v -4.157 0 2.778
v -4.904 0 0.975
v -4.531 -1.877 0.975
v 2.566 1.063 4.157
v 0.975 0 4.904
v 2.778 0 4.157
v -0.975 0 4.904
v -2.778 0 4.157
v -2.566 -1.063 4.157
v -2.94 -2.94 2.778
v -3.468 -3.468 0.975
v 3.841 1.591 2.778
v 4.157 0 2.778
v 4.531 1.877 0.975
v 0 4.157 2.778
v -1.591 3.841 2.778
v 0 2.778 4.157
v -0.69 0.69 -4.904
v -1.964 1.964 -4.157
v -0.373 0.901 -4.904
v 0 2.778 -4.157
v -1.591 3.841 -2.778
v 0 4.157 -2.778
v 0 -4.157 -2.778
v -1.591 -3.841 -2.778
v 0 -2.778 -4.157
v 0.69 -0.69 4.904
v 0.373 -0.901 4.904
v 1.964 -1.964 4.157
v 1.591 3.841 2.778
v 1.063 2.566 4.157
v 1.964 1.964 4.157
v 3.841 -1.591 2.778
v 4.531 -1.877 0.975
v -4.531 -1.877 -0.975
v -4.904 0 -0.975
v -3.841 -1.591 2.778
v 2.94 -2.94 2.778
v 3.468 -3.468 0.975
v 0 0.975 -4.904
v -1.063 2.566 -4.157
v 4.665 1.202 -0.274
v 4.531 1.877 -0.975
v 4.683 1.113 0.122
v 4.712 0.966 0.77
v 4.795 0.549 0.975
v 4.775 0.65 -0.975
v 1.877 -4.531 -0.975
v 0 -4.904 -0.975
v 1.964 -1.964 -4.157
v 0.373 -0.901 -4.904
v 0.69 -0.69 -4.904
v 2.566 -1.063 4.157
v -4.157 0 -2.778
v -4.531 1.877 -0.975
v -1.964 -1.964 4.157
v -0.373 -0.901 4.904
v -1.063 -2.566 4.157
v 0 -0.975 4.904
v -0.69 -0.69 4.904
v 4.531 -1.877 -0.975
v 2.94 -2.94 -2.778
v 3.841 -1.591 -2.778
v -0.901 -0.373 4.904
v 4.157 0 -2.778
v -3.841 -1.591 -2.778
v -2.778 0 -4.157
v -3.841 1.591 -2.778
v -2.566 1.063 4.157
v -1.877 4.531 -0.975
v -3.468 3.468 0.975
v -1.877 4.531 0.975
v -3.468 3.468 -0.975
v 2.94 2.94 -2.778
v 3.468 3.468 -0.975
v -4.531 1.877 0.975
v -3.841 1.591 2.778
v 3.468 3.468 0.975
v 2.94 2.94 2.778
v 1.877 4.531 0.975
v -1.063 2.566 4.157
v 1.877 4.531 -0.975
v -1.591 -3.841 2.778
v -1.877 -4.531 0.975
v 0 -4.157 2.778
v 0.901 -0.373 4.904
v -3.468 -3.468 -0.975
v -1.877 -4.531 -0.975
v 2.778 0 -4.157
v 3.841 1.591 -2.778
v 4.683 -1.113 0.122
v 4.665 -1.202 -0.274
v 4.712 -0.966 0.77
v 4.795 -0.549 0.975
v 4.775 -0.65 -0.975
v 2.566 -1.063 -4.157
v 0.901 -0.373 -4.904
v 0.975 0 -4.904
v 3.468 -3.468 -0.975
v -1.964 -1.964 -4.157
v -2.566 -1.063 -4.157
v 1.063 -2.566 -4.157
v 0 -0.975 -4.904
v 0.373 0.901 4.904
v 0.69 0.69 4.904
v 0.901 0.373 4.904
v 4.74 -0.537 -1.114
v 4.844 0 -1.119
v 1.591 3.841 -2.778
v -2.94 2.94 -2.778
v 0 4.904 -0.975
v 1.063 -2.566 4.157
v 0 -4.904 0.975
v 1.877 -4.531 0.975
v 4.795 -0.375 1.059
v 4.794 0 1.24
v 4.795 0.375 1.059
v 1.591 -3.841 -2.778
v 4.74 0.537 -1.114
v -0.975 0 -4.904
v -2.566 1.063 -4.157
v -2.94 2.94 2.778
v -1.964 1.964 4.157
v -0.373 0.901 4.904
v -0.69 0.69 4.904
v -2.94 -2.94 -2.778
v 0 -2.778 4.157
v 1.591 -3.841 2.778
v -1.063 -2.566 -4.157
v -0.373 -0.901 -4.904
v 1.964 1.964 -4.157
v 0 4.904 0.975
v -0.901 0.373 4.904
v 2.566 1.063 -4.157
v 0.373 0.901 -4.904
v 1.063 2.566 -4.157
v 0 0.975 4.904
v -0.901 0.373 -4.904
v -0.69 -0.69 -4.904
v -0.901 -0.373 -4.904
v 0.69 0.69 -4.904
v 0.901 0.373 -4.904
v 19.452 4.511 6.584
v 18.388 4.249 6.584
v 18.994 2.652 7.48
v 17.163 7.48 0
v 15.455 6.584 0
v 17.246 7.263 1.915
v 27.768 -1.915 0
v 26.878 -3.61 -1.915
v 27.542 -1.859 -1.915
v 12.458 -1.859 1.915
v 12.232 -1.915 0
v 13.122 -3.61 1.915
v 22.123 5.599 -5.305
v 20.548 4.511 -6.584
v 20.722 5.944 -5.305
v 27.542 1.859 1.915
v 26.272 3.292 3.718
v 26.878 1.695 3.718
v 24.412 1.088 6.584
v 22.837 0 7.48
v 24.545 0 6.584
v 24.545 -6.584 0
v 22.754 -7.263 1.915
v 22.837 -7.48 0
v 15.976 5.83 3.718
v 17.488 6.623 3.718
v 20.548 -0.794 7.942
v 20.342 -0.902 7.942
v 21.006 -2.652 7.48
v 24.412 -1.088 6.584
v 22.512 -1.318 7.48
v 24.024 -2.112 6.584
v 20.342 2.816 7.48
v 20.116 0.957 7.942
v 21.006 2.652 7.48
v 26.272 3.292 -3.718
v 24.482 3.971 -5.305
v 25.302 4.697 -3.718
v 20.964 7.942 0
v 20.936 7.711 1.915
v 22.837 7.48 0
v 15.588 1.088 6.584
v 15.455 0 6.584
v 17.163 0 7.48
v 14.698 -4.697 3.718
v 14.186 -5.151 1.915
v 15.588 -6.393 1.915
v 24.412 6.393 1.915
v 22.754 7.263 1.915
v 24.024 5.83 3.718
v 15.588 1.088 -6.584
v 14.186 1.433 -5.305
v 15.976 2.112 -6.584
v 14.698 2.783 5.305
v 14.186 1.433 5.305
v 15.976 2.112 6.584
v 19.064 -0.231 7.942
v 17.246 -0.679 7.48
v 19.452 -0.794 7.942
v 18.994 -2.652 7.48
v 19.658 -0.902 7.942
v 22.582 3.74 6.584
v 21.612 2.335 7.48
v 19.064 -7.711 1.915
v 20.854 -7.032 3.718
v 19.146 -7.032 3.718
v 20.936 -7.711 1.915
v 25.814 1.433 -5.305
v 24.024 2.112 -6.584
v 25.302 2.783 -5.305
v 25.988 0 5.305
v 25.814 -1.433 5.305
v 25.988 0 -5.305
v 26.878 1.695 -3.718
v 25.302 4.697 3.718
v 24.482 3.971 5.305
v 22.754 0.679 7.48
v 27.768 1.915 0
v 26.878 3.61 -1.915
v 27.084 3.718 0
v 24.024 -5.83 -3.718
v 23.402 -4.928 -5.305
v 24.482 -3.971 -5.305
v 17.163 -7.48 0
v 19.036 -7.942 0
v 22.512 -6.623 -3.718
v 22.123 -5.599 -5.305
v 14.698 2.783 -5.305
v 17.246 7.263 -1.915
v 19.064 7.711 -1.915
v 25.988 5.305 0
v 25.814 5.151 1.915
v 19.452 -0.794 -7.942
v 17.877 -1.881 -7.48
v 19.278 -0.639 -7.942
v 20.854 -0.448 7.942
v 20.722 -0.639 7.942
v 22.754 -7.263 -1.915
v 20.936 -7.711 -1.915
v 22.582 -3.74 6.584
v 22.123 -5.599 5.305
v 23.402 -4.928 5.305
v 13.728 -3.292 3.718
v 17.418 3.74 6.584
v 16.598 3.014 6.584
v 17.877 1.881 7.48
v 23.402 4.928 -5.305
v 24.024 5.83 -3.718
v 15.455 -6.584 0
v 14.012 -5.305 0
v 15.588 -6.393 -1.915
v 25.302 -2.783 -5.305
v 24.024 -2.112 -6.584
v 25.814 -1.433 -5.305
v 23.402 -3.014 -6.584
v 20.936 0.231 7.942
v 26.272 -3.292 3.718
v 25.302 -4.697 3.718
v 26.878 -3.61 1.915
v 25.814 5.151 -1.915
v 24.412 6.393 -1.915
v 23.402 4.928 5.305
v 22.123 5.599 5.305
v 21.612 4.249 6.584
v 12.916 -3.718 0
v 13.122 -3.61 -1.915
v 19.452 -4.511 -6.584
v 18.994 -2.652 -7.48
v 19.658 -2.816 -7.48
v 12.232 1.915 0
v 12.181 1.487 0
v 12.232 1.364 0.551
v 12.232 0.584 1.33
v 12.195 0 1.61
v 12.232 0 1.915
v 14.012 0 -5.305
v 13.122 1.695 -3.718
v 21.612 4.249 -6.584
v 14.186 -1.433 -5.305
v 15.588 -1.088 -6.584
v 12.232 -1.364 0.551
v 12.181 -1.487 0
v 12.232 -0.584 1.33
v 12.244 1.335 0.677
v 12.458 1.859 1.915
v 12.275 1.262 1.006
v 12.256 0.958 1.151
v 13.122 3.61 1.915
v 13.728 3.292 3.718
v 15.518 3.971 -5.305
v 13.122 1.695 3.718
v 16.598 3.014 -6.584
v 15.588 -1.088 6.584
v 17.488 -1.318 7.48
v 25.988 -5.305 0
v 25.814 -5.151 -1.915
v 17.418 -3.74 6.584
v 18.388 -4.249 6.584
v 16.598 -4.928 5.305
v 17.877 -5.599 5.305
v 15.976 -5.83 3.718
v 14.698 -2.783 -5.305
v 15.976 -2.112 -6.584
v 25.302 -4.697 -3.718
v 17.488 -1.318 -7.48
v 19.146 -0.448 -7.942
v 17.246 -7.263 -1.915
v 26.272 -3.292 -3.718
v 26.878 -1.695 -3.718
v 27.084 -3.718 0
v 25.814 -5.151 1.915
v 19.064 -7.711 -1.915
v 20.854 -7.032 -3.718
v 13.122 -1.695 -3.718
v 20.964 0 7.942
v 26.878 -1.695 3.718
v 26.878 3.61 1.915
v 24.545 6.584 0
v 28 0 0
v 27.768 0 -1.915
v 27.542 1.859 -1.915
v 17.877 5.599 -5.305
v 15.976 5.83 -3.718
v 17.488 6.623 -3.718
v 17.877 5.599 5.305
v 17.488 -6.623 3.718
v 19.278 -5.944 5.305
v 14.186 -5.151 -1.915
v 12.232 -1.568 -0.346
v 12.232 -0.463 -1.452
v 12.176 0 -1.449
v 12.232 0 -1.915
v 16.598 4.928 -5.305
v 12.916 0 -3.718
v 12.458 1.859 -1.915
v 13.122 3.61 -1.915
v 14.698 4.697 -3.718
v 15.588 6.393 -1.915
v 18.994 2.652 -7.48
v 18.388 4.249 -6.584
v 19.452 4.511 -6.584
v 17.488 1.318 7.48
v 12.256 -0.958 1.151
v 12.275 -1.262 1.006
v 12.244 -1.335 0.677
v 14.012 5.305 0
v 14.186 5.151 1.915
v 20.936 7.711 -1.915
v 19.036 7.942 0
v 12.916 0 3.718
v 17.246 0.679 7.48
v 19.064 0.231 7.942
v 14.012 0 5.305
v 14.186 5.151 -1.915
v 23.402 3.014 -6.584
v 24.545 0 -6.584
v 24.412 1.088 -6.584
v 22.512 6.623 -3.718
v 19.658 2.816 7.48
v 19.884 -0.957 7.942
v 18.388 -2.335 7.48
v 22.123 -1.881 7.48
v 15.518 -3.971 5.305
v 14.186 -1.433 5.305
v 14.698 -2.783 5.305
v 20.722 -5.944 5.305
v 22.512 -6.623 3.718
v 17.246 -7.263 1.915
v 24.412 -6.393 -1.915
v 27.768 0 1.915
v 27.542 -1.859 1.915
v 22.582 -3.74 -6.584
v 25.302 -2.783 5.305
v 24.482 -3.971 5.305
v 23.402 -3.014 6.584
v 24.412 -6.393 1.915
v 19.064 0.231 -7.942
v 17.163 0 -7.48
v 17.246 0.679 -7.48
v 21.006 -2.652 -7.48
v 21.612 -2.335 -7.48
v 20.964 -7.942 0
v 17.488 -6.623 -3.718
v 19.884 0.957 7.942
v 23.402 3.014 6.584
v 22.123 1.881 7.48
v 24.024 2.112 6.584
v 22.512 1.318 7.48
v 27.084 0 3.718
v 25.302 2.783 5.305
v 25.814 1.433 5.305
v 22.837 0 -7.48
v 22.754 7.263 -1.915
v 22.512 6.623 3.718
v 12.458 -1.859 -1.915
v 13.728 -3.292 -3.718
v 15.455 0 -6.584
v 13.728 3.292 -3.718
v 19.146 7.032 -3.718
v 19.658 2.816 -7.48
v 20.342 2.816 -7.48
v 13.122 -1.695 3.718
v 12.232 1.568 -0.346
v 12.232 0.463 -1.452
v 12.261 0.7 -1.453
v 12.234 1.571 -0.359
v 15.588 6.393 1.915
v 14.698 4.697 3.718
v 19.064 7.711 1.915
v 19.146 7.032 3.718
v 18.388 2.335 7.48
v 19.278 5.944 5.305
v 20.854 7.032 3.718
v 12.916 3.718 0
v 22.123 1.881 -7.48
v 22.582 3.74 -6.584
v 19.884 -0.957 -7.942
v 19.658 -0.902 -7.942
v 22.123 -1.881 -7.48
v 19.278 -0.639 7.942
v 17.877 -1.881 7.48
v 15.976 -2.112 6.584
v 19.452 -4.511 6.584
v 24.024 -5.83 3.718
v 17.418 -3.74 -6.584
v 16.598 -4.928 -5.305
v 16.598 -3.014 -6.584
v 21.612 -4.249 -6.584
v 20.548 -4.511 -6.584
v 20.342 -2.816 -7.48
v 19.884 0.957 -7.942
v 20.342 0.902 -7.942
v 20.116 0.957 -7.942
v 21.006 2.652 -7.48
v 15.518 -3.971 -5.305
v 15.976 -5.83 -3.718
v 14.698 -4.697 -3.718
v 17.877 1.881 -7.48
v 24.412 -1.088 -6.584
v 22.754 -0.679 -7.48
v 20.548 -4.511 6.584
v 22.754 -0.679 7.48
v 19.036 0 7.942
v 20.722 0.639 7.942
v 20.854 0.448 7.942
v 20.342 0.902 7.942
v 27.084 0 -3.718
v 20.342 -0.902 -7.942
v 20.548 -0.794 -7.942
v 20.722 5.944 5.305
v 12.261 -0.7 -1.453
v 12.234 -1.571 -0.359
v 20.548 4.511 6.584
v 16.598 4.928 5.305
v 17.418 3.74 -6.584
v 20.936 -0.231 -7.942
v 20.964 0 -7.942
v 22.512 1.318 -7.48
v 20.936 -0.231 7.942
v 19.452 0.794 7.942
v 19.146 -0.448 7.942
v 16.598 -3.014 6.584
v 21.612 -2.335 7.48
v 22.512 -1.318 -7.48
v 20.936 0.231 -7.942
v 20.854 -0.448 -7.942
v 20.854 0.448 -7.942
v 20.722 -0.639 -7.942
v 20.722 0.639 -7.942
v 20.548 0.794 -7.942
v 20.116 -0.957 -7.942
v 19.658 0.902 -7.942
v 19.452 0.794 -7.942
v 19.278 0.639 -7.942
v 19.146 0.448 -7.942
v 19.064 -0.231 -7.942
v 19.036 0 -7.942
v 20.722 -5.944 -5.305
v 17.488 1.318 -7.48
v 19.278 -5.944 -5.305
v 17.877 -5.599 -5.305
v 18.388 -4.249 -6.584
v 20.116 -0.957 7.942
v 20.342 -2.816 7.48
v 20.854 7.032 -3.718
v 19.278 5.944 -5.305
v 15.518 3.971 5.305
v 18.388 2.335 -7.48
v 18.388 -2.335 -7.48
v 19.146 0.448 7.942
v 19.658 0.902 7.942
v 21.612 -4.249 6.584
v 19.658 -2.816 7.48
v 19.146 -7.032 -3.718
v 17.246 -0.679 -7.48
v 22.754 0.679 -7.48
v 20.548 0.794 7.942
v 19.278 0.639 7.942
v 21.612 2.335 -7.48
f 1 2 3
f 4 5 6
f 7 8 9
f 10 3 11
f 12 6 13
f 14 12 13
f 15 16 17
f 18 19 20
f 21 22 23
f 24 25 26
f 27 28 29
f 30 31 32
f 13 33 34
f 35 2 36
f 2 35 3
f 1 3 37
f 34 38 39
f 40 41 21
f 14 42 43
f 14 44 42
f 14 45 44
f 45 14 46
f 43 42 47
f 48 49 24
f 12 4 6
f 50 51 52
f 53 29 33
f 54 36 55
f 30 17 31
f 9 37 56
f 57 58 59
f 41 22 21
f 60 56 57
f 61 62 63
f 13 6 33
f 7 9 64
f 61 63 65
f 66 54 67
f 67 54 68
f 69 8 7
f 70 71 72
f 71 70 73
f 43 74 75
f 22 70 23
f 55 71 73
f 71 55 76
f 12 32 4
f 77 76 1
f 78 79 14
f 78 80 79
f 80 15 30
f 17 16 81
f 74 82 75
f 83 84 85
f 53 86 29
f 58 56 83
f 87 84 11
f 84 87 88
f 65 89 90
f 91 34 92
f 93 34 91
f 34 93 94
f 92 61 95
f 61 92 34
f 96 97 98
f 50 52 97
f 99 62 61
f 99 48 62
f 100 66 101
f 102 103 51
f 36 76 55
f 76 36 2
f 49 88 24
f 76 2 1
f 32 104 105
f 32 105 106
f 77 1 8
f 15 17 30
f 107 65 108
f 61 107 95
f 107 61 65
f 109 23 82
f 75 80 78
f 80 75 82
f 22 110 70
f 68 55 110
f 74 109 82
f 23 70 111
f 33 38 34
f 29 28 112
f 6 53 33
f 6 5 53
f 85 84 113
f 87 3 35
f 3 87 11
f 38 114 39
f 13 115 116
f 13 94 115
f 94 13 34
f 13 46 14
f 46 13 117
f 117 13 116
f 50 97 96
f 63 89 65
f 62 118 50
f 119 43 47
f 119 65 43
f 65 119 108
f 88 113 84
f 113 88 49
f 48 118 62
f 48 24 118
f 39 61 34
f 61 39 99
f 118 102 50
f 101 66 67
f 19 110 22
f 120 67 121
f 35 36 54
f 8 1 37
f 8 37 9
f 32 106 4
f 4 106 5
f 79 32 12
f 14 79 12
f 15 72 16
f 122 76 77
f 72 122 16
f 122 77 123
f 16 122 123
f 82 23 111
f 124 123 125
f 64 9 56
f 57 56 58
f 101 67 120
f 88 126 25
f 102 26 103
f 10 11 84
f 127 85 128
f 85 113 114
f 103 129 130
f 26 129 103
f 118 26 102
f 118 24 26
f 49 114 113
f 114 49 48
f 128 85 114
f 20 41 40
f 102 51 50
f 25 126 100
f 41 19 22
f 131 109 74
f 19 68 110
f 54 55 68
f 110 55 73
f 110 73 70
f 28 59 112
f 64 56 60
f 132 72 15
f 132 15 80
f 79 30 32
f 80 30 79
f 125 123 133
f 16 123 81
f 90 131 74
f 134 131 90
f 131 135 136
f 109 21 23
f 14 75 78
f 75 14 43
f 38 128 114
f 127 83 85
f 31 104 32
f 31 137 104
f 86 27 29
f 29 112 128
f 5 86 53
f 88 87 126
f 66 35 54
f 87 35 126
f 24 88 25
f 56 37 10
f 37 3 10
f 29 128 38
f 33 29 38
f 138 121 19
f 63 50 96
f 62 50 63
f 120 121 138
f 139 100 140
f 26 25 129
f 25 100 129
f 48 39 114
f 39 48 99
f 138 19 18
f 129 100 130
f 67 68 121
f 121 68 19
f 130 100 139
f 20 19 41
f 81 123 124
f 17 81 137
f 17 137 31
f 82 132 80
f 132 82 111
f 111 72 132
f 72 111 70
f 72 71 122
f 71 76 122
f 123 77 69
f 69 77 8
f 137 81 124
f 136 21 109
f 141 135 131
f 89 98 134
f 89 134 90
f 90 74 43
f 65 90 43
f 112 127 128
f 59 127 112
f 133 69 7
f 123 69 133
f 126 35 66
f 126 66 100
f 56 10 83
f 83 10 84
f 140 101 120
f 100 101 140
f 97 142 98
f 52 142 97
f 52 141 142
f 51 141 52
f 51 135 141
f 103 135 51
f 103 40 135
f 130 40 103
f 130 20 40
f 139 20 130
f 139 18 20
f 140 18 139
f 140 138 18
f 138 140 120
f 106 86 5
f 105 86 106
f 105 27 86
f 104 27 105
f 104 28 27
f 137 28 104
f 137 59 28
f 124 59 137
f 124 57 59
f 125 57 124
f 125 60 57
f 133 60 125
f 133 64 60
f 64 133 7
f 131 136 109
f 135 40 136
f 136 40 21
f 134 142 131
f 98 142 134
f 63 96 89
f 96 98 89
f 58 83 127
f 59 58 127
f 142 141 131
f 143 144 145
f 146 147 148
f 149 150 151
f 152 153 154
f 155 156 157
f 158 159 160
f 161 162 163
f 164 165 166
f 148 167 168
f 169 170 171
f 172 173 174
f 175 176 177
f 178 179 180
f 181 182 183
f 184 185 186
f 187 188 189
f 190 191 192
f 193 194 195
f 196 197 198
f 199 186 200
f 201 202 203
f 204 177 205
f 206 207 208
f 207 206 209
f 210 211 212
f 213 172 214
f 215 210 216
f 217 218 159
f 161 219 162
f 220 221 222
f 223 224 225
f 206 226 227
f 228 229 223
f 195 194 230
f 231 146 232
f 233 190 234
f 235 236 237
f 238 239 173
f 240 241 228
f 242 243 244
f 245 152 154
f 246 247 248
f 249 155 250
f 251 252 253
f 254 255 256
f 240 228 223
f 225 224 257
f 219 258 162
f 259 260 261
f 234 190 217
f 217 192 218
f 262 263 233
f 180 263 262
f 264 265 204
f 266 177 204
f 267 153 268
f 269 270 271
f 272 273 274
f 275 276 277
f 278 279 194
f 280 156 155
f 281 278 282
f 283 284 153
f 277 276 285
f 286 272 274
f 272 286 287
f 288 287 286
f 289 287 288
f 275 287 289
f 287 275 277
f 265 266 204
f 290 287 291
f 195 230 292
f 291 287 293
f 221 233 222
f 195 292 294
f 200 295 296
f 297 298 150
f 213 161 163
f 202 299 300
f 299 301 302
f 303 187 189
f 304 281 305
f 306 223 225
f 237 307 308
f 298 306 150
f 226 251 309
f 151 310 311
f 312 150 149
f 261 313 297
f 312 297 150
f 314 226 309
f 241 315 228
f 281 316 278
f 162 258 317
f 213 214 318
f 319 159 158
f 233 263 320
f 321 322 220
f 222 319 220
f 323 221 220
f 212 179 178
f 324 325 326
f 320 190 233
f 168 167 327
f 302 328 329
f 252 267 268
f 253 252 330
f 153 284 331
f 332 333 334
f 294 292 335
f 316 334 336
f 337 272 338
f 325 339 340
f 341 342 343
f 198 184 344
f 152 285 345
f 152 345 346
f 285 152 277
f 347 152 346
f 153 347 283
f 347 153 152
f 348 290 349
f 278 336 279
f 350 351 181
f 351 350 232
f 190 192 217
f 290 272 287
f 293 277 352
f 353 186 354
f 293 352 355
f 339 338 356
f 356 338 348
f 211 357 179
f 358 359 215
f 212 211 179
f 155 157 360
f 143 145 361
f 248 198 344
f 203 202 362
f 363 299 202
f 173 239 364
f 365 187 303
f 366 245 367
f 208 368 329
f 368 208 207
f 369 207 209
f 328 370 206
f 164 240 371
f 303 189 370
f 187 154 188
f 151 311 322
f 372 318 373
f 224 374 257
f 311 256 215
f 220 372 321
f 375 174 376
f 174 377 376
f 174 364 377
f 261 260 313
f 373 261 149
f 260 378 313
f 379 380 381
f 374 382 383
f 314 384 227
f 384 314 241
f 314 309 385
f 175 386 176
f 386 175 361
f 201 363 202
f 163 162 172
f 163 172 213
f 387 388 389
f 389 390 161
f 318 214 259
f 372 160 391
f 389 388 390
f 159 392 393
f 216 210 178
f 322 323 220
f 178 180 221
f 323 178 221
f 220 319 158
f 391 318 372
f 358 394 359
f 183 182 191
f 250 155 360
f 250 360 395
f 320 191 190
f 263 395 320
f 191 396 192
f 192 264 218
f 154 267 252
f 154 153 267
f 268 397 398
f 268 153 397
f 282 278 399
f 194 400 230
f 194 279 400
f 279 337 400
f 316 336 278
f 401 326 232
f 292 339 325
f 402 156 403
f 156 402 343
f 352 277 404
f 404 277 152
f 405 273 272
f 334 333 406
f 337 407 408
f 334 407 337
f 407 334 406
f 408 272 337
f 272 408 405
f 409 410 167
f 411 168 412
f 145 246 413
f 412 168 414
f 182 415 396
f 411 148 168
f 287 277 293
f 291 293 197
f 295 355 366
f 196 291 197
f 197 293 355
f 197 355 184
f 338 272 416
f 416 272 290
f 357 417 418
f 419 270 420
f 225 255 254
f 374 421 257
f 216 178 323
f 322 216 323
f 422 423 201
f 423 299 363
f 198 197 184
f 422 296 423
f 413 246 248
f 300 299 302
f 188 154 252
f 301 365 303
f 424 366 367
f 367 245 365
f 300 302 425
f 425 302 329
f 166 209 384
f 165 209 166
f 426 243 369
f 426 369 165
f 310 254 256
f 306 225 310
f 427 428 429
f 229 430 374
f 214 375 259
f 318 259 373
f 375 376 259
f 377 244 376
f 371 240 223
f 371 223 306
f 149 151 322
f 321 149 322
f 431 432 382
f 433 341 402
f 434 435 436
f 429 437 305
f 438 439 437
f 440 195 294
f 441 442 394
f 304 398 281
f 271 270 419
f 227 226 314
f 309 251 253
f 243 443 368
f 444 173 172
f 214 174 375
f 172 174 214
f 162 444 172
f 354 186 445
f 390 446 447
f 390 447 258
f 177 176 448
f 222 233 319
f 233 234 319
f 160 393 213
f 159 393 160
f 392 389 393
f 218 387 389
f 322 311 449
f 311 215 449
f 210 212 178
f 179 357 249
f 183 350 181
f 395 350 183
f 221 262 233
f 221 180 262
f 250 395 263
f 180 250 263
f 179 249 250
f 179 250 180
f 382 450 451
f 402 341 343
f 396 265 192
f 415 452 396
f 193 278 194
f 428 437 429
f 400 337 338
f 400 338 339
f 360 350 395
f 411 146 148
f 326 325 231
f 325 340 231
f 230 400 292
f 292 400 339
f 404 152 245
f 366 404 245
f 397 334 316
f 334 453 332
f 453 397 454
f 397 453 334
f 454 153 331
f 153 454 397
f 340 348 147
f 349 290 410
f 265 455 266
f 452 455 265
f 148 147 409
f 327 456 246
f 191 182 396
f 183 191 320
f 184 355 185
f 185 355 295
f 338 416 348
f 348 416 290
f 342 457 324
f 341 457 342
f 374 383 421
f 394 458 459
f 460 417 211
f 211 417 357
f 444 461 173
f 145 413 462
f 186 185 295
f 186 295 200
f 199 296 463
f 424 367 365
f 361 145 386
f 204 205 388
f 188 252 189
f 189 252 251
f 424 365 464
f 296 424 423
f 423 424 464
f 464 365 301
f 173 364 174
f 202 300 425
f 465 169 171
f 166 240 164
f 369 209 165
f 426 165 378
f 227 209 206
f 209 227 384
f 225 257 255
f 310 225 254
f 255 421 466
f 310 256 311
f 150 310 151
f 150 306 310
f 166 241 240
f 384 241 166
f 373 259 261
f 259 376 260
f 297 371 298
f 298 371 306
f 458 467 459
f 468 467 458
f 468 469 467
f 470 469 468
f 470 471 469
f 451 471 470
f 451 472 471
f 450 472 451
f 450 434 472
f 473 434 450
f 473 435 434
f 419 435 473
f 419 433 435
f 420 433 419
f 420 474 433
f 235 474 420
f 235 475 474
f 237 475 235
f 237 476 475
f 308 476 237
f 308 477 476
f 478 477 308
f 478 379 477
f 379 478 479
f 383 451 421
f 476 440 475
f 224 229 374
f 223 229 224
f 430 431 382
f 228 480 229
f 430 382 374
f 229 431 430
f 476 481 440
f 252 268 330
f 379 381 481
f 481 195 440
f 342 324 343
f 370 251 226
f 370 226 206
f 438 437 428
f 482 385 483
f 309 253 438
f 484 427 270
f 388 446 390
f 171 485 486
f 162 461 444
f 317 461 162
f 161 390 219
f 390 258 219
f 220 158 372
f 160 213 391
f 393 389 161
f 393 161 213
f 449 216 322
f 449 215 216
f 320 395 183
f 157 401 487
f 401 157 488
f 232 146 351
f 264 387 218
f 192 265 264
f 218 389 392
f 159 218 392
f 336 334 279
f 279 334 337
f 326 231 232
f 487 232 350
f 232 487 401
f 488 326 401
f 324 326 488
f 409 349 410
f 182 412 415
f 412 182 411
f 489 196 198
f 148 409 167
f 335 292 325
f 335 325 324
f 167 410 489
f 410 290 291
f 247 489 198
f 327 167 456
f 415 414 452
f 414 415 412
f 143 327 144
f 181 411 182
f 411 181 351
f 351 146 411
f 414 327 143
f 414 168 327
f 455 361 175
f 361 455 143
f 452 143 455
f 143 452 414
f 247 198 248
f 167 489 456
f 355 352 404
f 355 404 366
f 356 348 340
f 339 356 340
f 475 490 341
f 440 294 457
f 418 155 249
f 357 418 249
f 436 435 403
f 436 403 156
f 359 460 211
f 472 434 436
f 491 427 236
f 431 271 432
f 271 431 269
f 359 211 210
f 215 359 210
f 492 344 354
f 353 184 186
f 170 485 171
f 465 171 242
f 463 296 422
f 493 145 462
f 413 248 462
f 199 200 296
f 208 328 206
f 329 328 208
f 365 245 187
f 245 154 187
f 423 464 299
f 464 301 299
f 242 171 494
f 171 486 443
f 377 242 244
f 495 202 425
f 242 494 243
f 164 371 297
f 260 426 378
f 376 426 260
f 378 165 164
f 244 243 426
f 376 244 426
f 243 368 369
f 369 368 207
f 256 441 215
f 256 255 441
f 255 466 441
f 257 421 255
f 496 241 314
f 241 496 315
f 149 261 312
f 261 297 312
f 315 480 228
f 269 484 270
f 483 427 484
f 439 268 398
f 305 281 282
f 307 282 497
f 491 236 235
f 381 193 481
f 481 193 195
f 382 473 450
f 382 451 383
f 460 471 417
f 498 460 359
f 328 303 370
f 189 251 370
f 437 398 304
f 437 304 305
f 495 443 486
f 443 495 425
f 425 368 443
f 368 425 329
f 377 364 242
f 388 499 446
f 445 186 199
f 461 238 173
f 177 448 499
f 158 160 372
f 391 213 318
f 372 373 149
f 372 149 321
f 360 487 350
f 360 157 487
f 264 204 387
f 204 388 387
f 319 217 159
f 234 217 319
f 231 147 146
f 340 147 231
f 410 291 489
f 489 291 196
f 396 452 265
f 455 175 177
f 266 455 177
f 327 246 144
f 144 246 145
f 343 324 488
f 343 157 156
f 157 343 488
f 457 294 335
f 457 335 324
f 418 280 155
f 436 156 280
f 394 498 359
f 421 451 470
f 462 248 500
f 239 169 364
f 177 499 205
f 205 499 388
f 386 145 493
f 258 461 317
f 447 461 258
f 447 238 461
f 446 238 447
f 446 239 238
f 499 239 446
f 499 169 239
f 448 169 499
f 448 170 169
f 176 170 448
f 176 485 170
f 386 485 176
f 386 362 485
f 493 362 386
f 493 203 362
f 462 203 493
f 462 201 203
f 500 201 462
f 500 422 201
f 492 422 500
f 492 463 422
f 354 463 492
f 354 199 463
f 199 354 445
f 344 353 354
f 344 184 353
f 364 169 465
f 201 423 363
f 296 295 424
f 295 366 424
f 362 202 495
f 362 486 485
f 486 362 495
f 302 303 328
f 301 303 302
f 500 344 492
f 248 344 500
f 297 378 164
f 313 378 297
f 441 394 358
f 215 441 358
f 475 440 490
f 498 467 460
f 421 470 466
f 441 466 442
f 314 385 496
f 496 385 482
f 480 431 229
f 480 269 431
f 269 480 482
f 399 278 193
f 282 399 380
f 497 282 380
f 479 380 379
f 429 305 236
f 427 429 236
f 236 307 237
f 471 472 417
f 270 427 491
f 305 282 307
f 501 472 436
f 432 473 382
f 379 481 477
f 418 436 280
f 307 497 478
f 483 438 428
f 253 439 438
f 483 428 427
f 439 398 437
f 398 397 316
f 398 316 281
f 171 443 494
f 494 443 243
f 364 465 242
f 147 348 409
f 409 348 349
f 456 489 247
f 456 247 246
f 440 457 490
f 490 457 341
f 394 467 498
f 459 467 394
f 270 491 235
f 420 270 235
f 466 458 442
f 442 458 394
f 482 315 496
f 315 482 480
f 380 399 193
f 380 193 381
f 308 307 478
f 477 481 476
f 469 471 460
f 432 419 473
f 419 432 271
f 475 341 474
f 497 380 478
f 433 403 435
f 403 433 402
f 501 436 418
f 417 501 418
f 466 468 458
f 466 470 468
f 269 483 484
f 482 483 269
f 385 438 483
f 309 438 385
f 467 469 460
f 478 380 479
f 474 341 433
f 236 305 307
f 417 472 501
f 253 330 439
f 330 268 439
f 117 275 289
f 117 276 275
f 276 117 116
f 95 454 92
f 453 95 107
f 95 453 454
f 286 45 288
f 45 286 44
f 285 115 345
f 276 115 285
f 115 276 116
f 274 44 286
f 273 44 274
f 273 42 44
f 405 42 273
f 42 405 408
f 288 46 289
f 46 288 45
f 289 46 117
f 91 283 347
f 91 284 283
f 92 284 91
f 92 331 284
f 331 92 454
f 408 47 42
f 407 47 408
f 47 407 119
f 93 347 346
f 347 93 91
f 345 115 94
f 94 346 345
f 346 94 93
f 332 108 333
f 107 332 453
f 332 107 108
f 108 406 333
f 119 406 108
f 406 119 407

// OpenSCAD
module mymod()
{

    sphere(r = 5);
    translate([20,0,0])
    {
        sphere(r = 8);
    }

    translate([20,0,0])
    {
        rotate([0,270,0])
        {
            cylinder(h=20,r1=2,r2=1);
        }
    }
}

mymod();
